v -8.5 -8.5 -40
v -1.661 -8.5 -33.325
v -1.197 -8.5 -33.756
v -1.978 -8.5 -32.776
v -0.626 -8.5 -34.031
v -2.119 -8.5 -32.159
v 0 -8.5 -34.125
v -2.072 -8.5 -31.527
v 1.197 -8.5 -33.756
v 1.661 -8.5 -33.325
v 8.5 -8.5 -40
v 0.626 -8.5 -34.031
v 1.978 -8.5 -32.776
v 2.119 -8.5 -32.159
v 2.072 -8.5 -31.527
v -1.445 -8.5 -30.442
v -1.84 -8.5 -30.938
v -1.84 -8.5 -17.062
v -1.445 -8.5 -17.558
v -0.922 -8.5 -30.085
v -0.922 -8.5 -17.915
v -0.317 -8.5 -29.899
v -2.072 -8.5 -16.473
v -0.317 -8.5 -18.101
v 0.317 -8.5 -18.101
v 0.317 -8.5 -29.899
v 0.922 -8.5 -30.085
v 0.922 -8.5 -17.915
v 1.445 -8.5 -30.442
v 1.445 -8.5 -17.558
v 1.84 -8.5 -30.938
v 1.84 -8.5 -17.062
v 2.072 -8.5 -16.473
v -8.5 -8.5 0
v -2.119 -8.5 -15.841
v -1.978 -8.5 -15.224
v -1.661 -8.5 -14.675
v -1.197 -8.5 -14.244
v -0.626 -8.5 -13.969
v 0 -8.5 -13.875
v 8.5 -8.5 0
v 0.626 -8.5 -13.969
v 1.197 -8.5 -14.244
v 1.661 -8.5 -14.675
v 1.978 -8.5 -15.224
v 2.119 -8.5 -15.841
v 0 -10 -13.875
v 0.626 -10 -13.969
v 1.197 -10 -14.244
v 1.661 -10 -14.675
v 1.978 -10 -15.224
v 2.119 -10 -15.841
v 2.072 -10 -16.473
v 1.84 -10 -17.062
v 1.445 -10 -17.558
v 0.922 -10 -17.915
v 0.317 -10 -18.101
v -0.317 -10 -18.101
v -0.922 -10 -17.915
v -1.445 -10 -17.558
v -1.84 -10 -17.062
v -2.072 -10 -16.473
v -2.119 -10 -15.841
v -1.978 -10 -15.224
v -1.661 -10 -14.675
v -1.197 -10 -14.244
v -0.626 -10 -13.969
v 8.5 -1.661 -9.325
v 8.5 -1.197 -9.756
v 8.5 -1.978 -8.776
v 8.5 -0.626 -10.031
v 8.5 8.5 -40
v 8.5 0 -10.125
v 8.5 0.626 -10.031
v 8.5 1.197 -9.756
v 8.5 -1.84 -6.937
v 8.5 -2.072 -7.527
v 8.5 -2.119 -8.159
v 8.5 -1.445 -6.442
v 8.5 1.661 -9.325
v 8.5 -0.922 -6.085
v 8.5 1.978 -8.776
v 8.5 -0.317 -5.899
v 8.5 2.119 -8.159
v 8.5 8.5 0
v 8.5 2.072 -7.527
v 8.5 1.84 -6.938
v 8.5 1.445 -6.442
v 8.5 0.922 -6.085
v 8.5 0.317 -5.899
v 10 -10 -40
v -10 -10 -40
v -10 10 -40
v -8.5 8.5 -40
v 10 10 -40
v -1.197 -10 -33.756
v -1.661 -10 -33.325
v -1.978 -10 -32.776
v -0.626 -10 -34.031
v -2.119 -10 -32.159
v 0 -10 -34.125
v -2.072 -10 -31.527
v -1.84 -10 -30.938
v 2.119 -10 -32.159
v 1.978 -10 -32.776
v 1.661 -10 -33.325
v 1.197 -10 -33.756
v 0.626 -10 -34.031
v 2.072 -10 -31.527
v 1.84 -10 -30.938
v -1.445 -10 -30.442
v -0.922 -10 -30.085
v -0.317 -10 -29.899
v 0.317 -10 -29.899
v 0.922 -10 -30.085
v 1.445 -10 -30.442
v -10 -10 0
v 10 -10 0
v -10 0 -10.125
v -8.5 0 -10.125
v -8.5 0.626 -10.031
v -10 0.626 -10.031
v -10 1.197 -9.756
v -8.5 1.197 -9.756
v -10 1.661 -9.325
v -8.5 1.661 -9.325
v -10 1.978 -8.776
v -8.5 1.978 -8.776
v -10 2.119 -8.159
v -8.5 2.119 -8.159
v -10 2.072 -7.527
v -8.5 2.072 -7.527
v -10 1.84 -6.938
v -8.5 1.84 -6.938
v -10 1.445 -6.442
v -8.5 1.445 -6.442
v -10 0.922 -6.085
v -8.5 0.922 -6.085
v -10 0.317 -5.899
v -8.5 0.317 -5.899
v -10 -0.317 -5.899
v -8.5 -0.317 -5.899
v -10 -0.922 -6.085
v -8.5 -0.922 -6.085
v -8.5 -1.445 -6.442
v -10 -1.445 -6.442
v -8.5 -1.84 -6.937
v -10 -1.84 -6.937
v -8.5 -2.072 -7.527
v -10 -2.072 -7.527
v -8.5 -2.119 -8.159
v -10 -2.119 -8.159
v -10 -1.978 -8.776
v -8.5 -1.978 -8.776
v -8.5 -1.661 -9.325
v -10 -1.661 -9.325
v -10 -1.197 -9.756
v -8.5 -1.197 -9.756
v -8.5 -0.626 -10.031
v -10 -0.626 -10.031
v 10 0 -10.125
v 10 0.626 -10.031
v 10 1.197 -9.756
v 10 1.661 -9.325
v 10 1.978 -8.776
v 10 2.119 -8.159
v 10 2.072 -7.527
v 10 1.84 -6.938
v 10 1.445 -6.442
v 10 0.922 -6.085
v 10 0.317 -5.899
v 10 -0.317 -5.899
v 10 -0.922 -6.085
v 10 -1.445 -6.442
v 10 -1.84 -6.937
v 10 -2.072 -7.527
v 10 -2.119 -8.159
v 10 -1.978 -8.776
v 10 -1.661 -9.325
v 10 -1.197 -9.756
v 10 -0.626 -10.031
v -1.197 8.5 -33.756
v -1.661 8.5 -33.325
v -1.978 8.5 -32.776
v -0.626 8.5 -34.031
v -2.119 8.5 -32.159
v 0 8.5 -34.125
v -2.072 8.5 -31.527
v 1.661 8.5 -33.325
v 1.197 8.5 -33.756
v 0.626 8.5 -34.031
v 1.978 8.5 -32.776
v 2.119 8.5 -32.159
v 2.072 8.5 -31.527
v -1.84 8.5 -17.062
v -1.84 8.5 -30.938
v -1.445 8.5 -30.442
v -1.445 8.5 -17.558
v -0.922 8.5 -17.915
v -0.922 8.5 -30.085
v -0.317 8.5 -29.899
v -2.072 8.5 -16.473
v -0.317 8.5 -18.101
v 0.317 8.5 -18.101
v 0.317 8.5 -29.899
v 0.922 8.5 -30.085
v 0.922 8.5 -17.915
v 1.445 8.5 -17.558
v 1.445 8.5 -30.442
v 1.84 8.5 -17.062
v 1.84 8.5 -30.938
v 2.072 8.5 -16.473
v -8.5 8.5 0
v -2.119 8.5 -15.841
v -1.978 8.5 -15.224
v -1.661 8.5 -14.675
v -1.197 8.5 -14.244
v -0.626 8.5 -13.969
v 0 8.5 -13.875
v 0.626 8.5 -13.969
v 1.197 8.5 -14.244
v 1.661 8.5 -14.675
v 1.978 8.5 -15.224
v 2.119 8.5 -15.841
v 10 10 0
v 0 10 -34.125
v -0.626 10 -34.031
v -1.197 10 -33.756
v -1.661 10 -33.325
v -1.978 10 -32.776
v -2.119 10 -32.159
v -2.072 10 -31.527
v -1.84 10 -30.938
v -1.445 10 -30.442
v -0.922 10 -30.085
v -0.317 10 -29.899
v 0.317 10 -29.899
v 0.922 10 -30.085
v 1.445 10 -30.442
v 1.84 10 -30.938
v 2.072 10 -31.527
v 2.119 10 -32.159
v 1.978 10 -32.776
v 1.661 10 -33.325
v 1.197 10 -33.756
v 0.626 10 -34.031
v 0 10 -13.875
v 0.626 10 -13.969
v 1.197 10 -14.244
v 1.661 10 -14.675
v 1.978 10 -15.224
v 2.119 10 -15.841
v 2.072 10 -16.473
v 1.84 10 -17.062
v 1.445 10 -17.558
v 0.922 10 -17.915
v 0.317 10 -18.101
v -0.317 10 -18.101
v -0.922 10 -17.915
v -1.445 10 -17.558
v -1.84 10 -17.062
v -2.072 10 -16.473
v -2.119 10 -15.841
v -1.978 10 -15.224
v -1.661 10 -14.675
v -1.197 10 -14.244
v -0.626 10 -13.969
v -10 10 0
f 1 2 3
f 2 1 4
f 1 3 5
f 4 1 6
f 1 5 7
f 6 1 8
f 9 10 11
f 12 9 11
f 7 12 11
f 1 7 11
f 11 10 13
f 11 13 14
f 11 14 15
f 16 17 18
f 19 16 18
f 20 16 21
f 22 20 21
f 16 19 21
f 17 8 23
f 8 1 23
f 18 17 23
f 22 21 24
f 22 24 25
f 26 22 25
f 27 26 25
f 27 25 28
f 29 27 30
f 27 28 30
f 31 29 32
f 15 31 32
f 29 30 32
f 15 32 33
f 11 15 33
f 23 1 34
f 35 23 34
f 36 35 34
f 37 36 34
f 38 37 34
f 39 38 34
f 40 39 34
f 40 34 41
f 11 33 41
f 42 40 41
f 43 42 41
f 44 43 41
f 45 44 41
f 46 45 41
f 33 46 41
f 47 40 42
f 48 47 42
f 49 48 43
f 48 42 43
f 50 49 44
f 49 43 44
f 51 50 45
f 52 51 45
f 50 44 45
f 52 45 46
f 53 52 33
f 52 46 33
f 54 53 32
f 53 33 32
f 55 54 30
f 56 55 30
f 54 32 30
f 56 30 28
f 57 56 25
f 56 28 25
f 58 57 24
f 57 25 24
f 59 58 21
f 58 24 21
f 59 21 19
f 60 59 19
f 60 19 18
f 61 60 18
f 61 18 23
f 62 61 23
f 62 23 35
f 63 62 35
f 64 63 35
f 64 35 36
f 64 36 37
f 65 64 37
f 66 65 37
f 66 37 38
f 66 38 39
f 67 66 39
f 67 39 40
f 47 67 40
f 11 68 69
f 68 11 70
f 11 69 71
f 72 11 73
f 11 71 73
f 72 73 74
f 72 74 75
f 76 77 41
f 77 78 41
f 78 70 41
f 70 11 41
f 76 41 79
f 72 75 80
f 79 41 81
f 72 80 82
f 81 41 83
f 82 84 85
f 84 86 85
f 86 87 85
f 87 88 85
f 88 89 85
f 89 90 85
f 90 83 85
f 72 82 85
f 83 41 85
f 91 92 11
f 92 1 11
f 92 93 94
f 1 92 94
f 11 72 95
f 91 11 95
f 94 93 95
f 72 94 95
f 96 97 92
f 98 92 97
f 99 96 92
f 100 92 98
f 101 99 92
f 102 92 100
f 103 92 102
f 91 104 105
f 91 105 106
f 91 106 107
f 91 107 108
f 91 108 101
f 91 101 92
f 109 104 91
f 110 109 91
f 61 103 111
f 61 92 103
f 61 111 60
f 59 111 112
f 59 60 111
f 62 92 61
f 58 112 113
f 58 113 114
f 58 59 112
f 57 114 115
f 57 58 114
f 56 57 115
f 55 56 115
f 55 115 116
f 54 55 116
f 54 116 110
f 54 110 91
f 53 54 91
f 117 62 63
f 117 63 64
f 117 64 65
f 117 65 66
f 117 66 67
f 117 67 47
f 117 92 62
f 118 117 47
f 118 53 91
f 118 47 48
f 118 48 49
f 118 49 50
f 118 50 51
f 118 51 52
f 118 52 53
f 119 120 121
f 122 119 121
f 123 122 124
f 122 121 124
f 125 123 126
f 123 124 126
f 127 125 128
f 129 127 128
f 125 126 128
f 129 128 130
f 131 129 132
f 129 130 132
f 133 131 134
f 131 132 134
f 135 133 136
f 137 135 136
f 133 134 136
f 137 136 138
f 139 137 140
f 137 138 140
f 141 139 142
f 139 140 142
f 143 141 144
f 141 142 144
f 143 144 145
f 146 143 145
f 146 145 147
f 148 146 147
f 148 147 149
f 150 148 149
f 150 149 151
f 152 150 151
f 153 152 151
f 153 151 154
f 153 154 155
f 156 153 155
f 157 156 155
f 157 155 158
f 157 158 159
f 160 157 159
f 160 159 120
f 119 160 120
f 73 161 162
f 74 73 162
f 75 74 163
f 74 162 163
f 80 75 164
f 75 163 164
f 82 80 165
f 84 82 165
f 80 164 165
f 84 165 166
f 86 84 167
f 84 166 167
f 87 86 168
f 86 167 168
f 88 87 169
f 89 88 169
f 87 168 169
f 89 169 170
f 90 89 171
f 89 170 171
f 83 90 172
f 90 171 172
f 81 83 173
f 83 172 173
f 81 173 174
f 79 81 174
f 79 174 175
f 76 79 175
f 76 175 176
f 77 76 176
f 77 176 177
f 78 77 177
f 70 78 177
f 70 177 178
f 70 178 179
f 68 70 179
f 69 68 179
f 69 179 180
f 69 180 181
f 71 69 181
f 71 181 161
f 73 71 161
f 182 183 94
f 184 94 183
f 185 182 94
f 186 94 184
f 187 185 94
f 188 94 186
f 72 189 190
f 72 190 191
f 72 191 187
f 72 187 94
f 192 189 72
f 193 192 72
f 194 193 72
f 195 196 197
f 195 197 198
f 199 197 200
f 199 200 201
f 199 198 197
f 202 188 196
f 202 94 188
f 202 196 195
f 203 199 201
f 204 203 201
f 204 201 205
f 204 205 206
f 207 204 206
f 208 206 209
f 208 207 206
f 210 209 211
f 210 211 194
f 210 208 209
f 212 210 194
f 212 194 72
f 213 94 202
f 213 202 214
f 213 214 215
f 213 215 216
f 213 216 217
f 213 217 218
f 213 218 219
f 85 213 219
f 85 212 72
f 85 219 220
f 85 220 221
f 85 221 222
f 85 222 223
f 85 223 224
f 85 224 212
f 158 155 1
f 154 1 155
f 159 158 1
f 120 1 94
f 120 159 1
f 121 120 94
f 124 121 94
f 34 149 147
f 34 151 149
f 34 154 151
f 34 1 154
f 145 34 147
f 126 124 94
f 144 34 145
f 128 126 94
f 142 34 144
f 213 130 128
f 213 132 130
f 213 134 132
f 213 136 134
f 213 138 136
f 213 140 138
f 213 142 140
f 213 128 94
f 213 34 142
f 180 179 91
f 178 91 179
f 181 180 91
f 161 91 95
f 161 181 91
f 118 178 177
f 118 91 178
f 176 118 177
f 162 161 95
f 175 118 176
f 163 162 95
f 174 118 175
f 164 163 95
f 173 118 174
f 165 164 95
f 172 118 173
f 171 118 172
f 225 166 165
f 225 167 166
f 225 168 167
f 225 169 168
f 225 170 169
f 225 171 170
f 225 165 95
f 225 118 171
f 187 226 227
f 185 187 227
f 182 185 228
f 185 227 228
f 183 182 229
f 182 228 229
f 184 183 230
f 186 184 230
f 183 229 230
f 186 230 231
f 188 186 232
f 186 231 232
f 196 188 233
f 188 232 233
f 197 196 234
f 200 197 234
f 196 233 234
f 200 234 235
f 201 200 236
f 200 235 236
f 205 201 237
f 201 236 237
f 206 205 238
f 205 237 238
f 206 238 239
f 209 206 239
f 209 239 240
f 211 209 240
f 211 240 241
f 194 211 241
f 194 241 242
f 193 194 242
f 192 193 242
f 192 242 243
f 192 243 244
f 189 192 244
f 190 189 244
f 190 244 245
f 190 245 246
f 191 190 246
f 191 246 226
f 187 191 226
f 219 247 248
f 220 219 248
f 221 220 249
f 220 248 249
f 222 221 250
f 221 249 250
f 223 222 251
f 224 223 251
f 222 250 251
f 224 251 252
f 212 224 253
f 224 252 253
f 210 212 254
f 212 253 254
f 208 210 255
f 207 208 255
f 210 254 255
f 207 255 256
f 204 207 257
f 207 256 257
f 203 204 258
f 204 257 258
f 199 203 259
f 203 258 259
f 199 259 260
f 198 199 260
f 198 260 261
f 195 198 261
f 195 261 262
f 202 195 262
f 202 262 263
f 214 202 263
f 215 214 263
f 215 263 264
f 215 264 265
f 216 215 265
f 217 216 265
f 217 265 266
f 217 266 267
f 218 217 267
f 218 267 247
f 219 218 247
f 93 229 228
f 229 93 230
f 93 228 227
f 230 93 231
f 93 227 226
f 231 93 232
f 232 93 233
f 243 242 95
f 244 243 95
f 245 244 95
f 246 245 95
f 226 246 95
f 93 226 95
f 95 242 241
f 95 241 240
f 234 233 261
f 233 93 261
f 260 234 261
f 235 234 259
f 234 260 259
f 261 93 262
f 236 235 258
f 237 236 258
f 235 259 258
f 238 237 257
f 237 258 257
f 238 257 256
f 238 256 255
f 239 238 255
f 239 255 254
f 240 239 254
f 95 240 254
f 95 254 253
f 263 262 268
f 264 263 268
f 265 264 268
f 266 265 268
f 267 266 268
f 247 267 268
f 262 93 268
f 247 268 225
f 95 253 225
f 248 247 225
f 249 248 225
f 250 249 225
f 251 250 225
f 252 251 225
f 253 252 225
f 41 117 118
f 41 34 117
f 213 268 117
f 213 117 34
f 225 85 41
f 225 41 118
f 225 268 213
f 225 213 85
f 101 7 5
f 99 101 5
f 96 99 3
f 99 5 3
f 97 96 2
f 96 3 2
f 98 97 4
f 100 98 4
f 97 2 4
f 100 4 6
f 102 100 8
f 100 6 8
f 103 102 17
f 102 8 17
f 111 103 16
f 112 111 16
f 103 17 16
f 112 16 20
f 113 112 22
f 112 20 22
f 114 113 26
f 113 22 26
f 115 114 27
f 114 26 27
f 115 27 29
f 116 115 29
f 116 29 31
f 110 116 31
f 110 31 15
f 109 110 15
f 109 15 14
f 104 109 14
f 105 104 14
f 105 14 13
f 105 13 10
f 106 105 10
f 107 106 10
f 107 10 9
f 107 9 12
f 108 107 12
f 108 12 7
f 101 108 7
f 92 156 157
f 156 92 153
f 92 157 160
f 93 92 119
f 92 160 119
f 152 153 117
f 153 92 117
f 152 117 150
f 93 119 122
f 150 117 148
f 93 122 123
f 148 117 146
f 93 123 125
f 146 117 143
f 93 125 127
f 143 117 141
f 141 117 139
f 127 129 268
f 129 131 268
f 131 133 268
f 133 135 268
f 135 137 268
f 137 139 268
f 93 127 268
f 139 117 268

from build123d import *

# Parameters (mm, degrees)
SKETCH1_W           = 20
SKETCH1_H           = 20
SKETCH1_W_2         = 17
SKETCH1_H_2         = 17
BOSS_EXTRUDE1_DEPTH = 40
SKETCH2_R           = 2.125
CUT_EXTRUDE1_DEPTH  = 46.82575695
SKETCH3_R           = 2.125
CUT_EXTRUDE2_DEPTH  = 46.82575695


with BuildPart() as part:
    # Sketch1 → Boss-Extrude1 (new body)
    with BuildSketch(Plane.XY):
        Rectangle(SKETCH1_W, SKETCH1_H)
        Rectangle(SKETCH1_W_2, SKETCH1_H_2, mode=Mode.SUBTRACT)
    extrude(amount=-BOSS_EXTRUDE1_DEPTH)

    # Sketch2 → Cut-Extrude1 (cut, through all)
    with BuildSketch(Plane(origin=(0, 10, 0), x_dir=(1, 0, 0), z_dir=(0, 1, 0))):
        with Locations(Location((0, 32, 0), (0, 0, 90))):
            Circle(SKETCH2_R)
        with Locations(Location((0, 16, 0), (0, 0, 270))):
            Circle(SKETCH2_R)
    extrude(amount=-CUT_EXTRUDE1_DEPTH, mode=Mode.SUBTRACT)

    # Sketch3 → Cut-Extrude2 (cut, through all)
    with BuildSketch(Plane(origin=(10, 0, 0), x_dir=(0, 0, -1), z_dir=(1, 0, 0))):
        with Locations((8, 0)):
            Circle(SKETCH3_R)
    extrude(amount=-CUT_EXTRUDE2_DEPTH, mode=Mode.SUBTRACT)


solid = part.part
